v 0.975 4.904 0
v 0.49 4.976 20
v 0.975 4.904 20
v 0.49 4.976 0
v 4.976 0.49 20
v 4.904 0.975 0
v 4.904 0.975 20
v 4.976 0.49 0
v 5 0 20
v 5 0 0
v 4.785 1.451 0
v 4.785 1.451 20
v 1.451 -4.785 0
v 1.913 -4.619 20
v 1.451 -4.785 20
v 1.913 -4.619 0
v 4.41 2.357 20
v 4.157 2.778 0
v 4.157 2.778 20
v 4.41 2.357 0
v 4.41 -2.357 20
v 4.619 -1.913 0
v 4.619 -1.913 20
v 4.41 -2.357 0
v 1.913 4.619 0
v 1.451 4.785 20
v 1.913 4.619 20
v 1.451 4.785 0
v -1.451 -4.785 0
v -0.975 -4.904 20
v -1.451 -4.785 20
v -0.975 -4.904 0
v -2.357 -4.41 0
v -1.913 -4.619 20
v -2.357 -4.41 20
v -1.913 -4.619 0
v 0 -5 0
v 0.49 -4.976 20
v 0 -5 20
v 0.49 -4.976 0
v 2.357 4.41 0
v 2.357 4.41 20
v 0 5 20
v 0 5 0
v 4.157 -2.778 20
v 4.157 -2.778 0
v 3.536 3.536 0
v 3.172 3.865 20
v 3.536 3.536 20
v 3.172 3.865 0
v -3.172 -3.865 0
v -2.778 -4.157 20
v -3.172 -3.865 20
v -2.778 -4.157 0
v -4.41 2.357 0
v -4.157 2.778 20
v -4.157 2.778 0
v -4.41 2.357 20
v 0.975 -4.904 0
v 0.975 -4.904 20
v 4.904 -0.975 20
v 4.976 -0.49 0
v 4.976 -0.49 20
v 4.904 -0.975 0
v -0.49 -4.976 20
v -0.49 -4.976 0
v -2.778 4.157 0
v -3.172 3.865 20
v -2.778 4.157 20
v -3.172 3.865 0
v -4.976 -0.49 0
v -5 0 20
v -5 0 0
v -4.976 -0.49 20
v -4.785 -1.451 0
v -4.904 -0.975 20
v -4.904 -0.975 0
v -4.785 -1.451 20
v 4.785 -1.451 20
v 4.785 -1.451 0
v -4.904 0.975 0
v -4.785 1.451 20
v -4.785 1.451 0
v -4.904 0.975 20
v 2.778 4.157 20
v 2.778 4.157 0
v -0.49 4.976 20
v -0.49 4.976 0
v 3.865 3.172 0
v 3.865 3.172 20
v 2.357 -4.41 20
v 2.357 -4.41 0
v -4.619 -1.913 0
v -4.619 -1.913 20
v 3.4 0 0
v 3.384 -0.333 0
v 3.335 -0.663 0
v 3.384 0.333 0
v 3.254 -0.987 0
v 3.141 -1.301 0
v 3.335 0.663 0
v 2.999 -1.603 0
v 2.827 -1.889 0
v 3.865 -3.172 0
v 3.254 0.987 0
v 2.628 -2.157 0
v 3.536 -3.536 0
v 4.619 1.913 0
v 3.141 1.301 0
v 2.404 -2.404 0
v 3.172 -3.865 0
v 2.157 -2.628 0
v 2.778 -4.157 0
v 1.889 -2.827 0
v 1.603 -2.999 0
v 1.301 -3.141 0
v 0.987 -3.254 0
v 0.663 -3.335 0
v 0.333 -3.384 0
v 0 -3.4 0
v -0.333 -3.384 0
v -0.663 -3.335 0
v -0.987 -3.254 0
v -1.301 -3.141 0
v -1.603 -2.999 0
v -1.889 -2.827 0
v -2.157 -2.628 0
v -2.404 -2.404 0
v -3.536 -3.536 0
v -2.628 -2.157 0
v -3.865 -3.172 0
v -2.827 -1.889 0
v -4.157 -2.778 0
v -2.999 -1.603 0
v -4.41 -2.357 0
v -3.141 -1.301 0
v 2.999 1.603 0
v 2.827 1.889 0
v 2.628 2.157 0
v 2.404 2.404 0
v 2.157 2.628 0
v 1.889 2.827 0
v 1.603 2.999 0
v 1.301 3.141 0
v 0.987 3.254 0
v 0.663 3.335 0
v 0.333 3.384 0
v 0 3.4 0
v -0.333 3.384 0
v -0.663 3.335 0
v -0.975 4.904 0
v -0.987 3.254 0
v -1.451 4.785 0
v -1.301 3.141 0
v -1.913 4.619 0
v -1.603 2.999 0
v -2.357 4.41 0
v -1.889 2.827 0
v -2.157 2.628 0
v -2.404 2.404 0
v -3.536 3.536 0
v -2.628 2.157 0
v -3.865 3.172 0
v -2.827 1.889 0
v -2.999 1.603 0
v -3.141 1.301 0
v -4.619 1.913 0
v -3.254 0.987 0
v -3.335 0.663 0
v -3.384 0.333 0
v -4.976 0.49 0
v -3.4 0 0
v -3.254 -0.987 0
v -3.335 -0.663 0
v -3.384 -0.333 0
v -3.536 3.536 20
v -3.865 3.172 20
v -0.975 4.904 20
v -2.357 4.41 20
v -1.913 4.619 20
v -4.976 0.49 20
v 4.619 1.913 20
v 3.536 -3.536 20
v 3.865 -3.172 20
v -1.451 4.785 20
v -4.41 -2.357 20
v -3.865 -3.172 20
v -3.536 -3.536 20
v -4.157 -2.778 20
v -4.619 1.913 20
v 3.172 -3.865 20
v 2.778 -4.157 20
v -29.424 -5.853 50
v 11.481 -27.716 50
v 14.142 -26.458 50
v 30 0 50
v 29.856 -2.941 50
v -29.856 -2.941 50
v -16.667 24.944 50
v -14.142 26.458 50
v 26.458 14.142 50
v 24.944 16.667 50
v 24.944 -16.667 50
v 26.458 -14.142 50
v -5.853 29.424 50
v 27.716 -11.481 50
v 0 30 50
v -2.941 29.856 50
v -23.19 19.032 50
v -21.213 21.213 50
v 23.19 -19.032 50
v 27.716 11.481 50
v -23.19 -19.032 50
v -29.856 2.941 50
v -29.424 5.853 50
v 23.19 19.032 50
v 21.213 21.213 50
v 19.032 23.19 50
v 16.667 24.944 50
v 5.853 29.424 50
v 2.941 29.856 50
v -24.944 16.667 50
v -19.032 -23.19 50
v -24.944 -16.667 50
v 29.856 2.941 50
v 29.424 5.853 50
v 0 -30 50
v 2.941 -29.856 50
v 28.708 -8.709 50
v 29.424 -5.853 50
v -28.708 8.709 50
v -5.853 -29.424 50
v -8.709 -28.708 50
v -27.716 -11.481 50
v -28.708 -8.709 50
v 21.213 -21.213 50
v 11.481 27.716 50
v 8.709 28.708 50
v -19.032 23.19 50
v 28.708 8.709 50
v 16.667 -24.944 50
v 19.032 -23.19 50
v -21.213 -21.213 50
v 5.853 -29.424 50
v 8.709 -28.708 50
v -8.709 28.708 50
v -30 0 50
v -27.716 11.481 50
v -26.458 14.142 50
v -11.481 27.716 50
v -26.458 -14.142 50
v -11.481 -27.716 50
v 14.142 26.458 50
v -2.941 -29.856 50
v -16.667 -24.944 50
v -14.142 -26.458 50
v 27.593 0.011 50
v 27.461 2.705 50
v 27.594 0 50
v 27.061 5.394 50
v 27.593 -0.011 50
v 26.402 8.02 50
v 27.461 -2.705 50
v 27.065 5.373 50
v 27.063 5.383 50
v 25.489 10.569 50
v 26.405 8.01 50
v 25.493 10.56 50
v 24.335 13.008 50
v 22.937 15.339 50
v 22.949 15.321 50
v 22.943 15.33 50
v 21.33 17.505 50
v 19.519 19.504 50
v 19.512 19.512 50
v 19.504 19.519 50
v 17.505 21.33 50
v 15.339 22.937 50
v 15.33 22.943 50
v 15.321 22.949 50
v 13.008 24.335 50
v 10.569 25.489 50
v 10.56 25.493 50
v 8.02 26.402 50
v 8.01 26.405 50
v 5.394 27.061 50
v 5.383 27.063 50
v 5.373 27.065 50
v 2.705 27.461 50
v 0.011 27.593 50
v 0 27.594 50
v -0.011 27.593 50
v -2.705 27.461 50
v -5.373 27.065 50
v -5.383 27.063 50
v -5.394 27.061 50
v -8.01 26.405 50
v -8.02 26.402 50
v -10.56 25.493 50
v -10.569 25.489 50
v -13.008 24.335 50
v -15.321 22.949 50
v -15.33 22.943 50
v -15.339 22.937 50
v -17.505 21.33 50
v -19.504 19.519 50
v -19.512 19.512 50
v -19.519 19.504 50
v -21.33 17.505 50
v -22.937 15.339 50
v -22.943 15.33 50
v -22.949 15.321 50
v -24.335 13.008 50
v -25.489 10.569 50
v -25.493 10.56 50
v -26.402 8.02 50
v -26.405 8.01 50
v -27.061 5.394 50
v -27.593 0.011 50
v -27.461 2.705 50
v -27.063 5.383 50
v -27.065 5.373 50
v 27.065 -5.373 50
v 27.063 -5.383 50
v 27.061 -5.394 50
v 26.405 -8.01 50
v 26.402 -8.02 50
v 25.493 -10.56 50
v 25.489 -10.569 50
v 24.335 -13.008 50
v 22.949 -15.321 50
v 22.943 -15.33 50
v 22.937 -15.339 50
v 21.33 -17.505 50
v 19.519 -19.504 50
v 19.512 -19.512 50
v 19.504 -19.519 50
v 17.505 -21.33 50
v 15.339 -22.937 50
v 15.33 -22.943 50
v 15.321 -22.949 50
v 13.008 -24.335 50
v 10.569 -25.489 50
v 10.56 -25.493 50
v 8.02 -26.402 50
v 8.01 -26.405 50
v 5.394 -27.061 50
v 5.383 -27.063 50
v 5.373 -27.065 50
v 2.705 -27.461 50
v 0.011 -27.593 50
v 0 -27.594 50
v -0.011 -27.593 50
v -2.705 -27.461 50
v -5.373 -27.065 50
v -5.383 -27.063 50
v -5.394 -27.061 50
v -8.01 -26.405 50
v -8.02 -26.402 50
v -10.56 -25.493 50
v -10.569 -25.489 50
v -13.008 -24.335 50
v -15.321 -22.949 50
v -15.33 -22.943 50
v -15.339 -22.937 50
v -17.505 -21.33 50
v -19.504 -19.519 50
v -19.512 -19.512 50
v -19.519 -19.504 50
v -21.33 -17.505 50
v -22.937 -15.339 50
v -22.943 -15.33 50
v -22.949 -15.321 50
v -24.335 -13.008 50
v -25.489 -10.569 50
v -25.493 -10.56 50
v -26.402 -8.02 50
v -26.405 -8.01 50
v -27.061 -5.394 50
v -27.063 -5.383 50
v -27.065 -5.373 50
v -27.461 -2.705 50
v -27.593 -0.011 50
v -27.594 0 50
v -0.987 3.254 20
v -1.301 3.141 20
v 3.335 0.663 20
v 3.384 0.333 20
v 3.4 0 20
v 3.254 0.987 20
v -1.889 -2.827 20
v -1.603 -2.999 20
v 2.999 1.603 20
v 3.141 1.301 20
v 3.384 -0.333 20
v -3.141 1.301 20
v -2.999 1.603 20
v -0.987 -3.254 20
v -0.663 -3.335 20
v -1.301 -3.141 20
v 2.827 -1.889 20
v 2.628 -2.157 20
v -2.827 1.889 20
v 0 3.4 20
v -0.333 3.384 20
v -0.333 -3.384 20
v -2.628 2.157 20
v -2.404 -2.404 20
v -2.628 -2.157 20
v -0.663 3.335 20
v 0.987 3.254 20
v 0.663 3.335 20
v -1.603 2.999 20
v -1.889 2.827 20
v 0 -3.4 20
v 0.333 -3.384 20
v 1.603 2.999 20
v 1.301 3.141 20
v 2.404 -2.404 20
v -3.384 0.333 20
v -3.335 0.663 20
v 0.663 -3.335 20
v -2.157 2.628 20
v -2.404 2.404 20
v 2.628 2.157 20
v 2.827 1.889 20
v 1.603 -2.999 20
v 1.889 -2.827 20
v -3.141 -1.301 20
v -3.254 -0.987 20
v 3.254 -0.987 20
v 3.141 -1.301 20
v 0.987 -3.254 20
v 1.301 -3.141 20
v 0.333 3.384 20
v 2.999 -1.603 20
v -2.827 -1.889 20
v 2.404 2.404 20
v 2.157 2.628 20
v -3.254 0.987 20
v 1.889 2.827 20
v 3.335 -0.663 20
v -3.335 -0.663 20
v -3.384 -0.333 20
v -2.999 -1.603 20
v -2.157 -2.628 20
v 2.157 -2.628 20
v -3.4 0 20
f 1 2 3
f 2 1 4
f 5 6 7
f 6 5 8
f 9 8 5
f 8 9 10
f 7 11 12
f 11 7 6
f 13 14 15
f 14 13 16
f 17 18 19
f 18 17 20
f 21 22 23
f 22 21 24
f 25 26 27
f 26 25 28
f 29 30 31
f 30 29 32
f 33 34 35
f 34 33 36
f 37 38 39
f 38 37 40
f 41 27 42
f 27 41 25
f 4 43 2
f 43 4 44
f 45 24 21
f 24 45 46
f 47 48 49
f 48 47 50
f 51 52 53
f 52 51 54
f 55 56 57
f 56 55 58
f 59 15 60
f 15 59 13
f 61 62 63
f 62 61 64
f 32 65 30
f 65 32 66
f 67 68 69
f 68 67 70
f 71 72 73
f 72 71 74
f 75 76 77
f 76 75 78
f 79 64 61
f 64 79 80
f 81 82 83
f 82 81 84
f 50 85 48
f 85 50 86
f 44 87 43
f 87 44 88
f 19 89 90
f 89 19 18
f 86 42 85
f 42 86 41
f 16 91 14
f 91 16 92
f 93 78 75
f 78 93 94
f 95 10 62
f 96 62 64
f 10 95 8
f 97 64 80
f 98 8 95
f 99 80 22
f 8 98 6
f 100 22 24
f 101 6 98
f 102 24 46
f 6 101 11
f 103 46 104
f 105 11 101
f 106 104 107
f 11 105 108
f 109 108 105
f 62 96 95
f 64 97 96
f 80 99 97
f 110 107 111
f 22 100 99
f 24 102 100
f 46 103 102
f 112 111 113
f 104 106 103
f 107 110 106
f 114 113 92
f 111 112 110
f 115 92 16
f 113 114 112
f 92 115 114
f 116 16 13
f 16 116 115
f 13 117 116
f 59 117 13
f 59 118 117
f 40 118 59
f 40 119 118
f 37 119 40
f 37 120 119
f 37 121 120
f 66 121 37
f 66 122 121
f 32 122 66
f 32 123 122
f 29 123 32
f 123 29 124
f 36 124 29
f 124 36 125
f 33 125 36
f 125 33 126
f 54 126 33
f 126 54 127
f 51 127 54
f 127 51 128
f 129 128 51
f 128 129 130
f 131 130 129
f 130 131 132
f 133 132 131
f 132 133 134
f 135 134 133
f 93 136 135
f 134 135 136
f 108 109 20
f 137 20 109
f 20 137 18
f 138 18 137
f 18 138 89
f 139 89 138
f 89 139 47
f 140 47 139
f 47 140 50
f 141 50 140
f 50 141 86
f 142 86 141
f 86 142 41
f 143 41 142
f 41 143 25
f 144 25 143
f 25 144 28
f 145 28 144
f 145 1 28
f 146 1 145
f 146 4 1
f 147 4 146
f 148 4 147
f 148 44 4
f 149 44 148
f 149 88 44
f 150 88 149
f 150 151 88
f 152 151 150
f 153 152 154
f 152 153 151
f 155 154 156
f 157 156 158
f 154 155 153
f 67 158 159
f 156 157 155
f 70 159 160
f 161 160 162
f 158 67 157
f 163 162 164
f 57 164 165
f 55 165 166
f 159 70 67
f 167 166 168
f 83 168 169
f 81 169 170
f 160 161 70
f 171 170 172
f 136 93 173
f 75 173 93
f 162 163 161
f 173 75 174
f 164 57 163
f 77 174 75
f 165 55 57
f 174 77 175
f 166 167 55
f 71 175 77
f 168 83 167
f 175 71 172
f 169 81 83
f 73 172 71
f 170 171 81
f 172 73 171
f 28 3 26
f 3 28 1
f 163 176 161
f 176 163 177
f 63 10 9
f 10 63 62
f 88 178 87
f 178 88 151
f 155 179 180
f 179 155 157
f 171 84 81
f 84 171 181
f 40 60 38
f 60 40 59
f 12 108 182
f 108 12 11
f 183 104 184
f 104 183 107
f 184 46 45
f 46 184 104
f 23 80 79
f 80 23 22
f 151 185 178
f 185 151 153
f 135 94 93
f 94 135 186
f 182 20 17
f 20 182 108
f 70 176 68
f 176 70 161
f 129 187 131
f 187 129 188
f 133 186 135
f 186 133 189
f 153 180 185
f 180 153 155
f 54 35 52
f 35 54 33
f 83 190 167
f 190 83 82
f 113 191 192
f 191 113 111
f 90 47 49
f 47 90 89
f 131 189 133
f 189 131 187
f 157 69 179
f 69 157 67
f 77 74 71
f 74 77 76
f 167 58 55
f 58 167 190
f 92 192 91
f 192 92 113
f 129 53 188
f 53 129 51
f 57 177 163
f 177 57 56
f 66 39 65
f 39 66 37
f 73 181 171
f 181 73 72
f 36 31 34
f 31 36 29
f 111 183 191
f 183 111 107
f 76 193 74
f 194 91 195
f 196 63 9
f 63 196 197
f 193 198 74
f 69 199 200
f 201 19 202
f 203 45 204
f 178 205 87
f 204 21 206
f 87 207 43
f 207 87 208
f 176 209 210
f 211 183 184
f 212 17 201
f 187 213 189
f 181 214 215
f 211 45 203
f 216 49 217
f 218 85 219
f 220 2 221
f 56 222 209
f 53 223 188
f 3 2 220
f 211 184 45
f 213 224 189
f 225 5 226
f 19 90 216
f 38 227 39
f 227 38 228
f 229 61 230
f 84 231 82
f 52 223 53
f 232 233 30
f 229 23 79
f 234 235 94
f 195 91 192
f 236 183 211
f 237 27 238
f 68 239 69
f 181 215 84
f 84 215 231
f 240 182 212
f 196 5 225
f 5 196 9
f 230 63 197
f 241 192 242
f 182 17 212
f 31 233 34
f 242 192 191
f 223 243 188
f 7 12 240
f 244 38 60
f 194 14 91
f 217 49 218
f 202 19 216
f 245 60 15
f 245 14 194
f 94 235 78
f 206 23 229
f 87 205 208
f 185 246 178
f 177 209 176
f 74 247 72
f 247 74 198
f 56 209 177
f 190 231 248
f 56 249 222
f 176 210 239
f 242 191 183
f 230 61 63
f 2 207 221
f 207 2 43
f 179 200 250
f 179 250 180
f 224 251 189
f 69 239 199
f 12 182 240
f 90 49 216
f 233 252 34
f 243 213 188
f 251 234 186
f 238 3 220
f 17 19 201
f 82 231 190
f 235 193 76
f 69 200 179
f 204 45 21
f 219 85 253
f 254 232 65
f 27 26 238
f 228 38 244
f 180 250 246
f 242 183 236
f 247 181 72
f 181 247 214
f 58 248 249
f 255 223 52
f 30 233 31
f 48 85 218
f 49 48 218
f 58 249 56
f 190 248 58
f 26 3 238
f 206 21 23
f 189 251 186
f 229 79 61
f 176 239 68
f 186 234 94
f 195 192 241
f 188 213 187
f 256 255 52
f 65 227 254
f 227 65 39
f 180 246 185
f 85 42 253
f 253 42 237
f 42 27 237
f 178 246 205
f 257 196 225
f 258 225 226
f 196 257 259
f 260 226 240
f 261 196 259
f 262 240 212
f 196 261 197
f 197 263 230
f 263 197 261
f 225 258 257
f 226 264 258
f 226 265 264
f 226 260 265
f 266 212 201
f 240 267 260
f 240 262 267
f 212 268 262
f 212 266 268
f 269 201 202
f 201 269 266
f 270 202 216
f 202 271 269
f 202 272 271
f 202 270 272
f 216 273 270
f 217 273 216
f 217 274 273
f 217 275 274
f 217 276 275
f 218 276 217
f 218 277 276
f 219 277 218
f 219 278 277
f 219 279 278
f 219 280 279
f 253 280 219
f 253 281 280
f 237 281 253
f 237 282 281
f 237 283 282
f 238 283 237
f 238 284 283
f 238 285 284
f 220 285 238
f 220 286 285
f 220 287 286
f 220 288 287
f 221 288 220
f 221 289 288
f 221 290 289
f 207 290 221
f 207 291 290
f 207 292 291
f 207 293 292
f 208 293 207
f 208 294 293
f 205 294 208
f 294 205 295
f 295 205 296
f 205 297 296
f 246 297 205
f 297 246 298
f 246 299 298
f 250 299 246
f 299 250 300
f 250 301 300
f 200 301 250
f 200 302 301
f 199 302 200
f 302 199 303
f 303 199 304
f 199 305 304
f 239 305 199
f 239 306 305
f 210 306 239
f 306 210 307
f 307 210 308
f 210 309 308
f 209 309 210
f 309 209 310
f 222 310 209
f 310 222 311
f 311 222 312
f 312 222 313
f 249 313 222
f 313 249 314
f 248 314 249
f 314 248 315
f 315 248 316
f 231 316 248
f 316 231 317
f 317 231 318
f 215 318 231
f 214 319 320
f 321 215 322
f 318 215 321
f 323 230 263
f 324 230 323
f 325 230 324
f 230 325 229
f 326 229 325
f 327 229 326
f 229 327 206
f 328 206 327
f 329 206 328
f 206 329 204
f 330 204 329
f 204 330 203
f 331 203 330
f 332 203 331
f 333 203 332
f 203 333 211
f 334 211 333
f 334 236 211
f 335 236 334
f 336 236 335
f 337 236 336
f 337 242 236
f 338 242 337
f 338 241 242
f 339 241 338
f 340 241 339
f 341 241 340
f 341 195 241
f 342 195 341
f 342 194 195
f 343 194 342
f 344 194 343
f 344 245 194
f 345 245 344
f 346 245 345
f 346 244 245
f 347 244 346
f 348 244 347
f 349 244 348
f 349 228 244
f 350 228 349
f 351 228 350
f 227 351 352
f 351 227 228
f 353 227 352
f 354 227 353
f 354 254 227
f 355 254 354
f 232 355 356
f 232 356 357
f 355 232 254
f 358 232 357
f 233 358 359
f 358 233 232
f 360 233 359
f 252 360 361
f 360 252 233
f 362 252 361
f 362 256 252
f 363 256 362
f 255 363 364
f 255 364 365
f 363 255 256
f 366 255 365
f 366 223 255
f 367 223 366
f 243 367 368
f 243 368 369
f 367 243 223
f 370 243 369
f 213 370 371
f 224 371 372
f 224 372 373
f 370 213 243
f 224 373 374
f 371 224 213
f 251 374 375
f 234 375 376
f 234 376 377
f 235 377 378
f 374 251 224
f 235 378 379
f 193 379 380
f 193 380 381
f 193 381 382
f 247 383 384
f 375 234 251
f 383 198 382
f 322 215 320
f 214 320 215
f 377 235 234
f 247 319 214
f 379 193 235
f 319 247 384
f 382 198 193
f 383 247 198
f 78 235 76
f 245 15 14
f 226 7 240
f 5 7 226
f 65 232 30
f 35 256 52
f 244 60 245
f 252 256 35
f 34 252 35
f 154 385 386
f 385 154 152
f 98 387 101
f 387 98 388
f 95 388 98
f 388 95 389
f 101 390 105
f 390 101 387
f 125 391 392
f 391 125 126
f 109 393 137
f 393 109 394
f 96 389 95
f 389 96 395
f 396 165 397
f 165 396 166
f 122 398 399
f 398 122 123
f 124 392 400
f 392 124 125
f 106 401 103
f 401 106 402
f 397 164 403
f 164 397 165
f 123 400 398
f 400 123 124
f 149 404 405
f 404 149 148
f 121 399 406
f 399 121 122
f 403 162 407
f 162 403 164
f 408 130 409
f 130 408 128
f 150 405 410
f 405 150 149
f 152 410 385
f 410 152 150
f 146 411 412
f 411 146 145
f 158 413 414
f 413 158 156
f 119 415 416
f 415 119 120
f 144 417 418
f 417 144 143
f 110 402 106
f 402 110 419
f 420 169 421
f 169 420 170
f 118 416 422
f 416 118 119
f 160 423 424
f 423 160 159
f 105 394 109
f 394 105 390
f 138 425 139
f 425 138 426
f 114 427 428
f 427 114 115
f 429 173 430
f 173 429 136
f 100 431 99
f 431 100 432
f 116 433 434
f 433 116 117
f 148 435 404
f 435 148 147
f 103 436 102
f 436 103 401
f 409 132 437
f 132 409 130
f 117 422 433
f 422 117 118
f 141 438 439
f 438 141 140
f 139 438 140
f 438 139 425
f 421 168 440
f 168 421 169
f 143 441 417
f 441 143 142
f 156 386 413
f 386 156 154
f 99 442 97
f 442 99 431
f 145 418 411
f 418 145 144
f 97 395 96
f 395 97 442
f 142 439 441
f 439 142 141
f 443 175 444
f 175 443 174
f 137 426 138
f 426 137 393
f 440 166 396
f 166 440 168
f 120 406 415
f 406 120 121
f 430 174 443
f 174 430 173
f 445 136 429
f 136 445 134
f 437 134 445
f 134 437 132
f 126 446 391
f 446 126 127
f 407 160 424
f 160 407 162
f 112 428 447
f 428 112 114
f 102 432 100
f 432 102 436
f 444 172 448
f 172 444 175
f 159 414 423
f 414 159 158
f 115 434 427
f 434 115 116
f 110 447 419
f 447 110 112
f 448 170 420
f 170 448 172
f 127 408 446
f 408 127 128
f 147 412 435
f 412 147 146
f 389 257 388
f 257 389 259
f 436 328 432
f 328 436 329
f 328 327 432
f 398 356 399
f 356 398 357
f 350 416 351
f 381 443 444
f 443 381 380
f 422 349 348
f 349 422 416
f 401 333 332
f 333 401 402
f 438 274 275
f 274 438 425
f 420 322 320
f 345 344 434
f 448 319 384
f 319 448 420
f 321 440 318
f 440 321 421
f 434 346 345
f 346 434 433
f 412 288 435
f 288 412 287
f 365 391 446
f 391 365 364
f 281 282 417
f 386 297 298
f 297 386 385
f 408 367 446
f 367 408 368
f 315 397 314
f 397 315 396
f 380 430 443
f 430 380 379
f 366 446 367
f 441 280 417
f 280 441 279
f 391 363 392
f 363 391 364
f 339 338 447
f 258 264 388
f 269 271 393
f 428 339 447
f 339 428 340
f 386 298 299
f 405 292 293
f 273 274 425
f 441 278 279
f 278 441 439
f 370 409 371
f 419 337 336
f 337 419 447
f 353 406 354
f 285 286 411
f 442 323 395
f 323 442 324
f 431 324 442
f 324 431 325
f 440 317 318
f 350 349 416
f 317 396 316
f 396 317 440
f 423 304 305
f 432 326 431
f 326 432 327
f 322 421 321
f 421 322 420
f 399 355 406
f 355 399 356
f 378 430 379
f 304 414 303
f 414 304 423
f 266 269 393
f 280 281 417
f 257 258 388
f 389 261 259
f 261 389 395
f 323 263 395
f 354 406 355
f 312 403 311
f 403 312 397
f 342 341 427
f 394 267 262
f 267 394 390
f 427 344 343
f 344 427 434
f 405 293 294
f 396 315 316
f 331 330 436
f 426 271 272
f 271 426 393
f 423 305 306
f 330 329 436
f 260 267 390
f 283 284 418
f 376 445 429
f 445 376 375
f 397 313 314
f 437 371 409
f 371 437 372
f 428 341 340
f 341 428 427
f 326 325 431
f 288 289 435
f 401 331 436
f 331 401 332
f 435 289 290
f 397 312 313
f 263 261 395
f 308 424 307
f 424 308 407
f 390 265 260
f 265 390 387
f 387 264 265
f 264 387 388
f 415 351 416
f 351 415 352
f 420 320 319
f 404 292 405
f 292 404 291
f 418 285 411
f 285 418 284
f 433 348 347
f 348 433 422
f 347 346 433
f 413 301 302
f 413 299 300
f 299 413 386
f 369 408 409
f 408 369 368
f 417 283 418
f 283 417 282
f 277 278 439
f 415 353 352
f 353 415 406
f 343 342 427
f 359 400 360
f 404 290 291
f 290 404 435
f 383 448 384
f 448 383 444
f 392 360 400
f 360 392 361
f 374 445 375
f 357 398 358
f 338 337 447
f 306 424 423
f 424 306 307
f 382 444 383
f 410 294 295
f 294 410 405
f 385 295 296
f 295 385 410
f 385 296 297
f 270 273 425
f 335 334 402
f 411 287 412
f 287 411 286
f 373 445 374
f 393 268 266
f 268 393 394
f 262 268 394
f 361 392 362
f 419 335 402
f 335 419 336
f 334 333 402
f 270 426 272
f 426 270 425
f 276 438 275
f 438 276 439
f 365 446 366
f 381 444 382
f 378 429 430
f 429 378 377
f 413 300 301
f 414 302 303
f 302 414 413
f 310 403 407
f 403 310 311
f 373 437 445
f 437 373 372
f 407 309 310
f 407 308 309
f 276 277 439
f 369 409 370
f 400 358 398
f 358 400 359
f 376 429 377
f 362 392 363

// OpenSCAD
// Funnel - a spout (tube) sitting below a conical section, open at both ends for fluid flow.
// NOVEL general part for a lab or craft. DO NOT use in contact with skin or food.
//

spout_d = 10;
spout_z = 20;
cone_d  = 60;
rim_z   = 50;
wall    = 1.6;

$fn = 64;

ib = spout_d - 2 * wall;   // spout bore
ic = cone_d - 2 * wall;    // cone inner diameter at the spout top

difference() {
    union() {
        cylinder(h = spout_z, d = spout_d);                 // spout
        translate([0, 0, spout_z]) cylinder(h = rim_z - spout_z, d1 = spout_d, d2 = cone_d);  // cone
    }
    translate([0, 0, -1]) cylinder(h = spout_z + 2, d = ib);                     // bore through spout
    translate([0, 0, spout_z]) cylinder(h = rim_z - spout_z + 1, d1 = ib, d2 = ic);  // cone inner space
}
